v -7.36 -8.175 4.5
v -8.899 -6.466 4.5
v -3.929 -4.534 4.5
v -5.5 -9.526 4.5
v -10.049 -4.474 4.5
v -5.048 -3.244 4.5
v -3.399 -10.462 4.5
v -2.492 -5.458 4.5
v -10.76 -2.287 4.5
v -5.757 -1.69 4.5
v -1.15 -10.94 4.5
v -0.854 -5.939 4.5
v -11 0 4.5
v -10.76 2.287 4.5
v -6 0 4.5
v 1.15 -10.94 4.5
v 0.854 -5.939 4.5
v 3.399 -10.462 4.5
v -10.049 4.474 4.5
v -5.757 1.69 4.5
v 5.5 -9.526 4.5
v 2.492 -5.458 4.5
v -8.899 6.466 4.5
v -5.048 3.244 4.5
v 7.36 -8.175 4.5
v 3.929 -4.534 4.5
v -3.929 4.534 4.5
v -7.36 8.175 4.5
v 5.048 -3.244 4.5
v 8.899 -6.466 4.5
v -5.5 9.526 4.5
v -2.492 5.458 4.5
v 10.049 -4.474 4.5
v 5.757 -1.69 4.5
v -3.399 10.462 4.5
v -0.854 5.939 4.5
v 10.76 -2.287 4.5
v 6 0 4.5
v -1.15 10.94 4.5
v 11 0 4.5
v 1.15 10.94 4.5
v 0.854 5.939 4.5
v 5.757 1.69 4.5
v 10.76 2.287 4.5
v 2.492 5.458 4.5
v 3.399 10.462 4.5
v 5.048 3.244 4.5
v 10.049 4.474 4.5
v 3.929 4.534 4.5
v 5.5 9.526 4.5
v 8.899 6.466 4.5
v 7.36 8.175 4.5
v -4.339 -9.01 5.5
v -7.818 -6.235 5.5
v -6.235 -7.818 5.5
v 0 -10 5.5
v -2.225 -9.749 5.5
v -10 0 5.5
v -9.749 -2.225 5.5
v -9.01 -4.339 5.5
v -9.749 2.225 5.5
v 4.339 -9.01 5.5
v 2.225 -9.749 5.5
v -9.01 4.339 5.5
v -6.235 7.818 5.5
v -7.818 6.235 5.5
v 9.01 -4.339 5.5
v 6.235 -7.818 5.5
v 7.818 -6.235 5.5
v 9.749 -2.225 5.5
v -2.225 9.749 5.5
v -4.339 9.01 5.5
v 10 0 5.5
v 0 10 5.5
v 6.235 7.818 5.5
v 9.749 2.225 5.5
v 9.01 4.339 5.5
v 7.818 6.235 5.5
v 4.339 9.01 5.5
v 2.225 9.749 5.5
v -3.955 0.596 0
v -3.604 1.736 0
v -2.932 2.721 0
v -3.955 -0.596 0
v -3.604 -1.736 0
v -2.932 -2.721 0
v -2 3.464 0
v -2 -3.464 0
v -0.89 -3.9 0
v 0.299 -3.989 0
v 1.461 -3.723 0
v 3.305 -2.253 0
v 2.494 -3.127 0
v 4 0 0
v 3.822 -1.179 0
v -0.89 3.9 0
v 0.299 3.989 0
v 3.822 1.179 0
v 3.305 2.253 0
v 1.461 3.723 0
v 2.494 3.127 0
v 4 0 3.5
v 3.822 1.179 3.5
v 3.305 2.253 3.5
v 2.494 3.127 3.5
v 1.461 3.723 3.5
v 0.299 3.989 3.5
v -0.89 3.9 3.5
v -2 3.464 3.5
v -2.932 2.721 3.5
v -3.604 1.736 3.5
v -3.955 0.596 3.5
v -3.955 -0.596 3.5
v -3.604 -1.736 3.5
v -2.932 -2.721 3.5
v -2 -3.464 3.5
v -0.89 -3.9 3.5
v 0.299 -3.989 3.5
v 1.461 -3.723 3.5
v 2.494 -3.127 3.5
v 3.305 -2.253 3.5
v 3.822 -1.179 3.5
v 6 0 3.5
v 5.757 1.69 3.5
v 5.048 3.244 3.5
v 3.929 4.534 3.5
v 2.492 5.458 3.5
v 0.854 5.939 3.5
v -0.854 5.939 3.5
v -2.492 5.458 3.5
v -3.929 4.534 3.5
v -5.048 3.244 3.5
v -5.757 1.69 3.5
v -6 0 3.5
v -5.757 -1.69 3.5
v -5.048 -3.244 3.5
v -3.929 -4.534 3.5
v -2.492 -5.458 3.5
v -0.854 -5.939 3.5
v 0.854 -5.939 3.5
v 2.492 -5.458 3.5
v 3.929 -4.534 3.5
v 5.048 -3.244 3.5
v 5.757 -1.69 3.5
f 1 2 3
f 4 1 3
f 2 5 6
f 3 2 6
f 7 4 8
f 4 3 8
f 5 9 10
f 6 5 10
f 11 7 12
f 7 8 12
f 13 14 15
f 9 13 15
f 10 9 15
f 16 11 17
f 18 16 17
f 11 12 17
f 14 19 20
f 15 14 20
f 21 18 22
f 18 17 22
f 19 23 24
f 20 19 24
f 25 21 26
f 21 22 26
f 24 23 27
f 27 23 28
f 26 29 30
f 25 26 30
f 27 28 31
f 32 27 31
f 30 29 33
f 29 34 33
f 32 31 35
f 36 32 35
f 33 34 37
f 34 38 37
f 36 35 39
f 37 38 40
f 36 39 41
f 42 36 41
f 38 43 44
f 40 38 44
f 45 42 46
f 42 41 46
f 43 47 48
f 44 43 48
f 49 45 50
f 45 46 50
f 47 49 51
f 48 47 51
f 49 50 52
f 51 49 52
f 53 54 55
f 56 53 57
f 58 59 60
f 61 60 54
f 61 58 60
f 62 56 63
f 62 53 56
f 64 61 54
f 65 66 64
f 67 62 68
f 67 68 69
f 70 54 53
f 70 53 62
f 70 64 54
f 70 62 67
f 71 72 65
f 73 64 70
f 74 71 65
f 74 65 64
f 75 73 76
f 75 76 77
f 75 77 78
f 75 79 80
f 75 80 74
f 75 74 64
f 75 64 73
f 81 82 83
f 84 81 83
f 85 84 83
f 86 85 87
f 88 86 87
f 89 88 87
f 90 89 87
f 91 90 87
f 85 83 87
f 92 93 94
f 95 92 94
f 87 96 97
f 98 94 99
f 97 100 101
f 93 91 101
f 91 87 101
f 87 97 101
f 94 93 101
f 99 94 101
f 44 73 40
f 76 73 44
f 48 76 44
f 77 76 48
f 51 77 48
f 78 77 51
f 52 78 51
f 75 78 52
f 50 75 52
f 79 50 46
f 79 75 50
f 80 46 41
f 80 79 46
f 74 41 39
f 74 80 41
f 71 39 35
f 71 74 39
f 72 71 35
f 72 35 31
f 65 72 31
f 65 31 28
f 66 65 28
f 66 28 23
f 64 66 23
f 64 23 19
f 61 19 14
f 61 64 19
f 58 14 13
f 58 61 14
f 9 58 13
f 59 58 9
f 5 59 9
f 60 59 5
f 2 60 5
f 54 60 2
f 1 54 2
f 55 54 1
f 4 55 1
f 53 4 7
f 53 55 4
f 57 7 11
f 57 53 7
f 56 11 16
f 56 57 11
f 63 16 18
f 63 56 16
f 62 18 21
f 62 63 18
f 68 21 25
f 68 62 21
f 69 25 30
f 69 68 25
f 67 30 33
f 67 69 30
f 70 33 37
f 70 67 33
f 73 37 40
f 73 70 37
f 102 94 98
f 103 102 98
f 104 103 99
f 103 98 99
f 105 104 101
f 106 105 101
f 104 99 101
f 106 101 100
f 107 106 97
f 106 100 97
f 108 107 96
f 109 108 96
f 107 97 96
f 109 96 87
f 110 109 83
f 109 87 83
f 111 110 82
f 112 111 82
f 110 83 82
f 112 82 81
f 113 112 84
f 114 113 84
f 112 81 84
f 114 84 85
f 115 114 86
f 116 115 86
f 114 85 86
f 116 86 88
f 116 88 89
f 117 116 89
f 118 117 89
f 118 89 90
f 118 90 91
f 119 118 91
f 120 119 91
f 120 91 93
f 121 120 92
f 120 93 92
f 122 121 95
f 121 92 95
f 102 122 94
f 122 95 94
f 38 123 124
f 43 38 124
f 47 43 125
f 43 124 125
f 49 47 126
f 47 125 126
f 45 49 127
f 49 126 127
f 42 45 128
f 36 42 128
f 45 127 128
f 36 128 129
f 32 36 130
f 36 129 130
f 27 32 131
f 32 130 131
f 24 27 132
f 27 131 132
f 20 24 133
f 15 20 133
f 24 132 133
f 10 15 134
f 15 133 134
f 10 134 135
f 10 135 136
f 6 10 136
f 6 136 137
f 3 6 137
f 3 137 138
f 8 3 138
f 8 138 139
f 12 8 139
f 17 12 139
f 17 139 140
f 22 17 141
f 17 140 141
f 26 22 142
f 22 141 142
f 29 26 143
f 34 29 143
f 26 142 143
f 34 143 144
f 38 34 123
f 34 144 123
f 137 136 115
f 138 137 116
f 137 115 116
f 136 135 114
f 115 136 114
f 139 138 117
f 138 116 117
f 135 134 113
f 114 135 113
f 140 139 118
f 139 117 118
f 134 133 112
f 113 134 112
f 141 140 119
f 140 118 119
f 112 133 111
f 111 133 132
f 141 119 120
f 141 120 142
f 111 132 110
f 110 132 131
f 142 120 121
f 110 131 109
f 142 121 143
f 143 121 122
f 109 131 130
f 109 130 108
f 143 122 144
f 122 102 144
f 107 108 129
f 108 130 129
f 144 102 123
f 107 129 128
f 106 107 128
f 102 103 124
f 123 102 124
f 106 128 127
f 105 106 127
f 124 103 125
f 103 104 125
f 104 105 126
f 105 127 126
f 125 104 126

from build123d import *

# Parameters (mm, degrees)
F0_R     = 4
F1_DEPTH = 3.5
F2_R     = 6
F3_DEPTH = 1
F4_R     = 11
F5_DEPTH = 1
F7_SIZE  = 0.99999


# Not quite as in the source:
# - a fillet or chamfer is up to 0.001 mm smaller than in the source, because OpenCascade refuses the exact size


with BuildPart() as f1:
    # F0 (on Top) → F1 (new body)
    with BuildSketch(Plane.XY):
        Circle(F0_R)
    extrude(amount=F1_DEPTH)

    # F2 (on face) → F3 (join)
    with BuildSketch(Plane.XY.offset(3.5)):
        Circle(F2_R)
    extrude(amount=F3_DEPTH)

    # F4 (on face) → F5 (join)
    with BuildSketch(Plane.XY.offset(4.5)):
        Circle(F4_R)
    extrude(amount=F5_DEPTH)

    # F7 (size 1 in the source; OpenCascade refuses exactly that, so slightly less here)
    f7_edges = [f1.edges().sort_by_distance(p)[0] for p in [
        (-11, 0, 5.5),
    ]]
    chamfer(f7_edges, length=F7_SIZE)


solid = f1.part
